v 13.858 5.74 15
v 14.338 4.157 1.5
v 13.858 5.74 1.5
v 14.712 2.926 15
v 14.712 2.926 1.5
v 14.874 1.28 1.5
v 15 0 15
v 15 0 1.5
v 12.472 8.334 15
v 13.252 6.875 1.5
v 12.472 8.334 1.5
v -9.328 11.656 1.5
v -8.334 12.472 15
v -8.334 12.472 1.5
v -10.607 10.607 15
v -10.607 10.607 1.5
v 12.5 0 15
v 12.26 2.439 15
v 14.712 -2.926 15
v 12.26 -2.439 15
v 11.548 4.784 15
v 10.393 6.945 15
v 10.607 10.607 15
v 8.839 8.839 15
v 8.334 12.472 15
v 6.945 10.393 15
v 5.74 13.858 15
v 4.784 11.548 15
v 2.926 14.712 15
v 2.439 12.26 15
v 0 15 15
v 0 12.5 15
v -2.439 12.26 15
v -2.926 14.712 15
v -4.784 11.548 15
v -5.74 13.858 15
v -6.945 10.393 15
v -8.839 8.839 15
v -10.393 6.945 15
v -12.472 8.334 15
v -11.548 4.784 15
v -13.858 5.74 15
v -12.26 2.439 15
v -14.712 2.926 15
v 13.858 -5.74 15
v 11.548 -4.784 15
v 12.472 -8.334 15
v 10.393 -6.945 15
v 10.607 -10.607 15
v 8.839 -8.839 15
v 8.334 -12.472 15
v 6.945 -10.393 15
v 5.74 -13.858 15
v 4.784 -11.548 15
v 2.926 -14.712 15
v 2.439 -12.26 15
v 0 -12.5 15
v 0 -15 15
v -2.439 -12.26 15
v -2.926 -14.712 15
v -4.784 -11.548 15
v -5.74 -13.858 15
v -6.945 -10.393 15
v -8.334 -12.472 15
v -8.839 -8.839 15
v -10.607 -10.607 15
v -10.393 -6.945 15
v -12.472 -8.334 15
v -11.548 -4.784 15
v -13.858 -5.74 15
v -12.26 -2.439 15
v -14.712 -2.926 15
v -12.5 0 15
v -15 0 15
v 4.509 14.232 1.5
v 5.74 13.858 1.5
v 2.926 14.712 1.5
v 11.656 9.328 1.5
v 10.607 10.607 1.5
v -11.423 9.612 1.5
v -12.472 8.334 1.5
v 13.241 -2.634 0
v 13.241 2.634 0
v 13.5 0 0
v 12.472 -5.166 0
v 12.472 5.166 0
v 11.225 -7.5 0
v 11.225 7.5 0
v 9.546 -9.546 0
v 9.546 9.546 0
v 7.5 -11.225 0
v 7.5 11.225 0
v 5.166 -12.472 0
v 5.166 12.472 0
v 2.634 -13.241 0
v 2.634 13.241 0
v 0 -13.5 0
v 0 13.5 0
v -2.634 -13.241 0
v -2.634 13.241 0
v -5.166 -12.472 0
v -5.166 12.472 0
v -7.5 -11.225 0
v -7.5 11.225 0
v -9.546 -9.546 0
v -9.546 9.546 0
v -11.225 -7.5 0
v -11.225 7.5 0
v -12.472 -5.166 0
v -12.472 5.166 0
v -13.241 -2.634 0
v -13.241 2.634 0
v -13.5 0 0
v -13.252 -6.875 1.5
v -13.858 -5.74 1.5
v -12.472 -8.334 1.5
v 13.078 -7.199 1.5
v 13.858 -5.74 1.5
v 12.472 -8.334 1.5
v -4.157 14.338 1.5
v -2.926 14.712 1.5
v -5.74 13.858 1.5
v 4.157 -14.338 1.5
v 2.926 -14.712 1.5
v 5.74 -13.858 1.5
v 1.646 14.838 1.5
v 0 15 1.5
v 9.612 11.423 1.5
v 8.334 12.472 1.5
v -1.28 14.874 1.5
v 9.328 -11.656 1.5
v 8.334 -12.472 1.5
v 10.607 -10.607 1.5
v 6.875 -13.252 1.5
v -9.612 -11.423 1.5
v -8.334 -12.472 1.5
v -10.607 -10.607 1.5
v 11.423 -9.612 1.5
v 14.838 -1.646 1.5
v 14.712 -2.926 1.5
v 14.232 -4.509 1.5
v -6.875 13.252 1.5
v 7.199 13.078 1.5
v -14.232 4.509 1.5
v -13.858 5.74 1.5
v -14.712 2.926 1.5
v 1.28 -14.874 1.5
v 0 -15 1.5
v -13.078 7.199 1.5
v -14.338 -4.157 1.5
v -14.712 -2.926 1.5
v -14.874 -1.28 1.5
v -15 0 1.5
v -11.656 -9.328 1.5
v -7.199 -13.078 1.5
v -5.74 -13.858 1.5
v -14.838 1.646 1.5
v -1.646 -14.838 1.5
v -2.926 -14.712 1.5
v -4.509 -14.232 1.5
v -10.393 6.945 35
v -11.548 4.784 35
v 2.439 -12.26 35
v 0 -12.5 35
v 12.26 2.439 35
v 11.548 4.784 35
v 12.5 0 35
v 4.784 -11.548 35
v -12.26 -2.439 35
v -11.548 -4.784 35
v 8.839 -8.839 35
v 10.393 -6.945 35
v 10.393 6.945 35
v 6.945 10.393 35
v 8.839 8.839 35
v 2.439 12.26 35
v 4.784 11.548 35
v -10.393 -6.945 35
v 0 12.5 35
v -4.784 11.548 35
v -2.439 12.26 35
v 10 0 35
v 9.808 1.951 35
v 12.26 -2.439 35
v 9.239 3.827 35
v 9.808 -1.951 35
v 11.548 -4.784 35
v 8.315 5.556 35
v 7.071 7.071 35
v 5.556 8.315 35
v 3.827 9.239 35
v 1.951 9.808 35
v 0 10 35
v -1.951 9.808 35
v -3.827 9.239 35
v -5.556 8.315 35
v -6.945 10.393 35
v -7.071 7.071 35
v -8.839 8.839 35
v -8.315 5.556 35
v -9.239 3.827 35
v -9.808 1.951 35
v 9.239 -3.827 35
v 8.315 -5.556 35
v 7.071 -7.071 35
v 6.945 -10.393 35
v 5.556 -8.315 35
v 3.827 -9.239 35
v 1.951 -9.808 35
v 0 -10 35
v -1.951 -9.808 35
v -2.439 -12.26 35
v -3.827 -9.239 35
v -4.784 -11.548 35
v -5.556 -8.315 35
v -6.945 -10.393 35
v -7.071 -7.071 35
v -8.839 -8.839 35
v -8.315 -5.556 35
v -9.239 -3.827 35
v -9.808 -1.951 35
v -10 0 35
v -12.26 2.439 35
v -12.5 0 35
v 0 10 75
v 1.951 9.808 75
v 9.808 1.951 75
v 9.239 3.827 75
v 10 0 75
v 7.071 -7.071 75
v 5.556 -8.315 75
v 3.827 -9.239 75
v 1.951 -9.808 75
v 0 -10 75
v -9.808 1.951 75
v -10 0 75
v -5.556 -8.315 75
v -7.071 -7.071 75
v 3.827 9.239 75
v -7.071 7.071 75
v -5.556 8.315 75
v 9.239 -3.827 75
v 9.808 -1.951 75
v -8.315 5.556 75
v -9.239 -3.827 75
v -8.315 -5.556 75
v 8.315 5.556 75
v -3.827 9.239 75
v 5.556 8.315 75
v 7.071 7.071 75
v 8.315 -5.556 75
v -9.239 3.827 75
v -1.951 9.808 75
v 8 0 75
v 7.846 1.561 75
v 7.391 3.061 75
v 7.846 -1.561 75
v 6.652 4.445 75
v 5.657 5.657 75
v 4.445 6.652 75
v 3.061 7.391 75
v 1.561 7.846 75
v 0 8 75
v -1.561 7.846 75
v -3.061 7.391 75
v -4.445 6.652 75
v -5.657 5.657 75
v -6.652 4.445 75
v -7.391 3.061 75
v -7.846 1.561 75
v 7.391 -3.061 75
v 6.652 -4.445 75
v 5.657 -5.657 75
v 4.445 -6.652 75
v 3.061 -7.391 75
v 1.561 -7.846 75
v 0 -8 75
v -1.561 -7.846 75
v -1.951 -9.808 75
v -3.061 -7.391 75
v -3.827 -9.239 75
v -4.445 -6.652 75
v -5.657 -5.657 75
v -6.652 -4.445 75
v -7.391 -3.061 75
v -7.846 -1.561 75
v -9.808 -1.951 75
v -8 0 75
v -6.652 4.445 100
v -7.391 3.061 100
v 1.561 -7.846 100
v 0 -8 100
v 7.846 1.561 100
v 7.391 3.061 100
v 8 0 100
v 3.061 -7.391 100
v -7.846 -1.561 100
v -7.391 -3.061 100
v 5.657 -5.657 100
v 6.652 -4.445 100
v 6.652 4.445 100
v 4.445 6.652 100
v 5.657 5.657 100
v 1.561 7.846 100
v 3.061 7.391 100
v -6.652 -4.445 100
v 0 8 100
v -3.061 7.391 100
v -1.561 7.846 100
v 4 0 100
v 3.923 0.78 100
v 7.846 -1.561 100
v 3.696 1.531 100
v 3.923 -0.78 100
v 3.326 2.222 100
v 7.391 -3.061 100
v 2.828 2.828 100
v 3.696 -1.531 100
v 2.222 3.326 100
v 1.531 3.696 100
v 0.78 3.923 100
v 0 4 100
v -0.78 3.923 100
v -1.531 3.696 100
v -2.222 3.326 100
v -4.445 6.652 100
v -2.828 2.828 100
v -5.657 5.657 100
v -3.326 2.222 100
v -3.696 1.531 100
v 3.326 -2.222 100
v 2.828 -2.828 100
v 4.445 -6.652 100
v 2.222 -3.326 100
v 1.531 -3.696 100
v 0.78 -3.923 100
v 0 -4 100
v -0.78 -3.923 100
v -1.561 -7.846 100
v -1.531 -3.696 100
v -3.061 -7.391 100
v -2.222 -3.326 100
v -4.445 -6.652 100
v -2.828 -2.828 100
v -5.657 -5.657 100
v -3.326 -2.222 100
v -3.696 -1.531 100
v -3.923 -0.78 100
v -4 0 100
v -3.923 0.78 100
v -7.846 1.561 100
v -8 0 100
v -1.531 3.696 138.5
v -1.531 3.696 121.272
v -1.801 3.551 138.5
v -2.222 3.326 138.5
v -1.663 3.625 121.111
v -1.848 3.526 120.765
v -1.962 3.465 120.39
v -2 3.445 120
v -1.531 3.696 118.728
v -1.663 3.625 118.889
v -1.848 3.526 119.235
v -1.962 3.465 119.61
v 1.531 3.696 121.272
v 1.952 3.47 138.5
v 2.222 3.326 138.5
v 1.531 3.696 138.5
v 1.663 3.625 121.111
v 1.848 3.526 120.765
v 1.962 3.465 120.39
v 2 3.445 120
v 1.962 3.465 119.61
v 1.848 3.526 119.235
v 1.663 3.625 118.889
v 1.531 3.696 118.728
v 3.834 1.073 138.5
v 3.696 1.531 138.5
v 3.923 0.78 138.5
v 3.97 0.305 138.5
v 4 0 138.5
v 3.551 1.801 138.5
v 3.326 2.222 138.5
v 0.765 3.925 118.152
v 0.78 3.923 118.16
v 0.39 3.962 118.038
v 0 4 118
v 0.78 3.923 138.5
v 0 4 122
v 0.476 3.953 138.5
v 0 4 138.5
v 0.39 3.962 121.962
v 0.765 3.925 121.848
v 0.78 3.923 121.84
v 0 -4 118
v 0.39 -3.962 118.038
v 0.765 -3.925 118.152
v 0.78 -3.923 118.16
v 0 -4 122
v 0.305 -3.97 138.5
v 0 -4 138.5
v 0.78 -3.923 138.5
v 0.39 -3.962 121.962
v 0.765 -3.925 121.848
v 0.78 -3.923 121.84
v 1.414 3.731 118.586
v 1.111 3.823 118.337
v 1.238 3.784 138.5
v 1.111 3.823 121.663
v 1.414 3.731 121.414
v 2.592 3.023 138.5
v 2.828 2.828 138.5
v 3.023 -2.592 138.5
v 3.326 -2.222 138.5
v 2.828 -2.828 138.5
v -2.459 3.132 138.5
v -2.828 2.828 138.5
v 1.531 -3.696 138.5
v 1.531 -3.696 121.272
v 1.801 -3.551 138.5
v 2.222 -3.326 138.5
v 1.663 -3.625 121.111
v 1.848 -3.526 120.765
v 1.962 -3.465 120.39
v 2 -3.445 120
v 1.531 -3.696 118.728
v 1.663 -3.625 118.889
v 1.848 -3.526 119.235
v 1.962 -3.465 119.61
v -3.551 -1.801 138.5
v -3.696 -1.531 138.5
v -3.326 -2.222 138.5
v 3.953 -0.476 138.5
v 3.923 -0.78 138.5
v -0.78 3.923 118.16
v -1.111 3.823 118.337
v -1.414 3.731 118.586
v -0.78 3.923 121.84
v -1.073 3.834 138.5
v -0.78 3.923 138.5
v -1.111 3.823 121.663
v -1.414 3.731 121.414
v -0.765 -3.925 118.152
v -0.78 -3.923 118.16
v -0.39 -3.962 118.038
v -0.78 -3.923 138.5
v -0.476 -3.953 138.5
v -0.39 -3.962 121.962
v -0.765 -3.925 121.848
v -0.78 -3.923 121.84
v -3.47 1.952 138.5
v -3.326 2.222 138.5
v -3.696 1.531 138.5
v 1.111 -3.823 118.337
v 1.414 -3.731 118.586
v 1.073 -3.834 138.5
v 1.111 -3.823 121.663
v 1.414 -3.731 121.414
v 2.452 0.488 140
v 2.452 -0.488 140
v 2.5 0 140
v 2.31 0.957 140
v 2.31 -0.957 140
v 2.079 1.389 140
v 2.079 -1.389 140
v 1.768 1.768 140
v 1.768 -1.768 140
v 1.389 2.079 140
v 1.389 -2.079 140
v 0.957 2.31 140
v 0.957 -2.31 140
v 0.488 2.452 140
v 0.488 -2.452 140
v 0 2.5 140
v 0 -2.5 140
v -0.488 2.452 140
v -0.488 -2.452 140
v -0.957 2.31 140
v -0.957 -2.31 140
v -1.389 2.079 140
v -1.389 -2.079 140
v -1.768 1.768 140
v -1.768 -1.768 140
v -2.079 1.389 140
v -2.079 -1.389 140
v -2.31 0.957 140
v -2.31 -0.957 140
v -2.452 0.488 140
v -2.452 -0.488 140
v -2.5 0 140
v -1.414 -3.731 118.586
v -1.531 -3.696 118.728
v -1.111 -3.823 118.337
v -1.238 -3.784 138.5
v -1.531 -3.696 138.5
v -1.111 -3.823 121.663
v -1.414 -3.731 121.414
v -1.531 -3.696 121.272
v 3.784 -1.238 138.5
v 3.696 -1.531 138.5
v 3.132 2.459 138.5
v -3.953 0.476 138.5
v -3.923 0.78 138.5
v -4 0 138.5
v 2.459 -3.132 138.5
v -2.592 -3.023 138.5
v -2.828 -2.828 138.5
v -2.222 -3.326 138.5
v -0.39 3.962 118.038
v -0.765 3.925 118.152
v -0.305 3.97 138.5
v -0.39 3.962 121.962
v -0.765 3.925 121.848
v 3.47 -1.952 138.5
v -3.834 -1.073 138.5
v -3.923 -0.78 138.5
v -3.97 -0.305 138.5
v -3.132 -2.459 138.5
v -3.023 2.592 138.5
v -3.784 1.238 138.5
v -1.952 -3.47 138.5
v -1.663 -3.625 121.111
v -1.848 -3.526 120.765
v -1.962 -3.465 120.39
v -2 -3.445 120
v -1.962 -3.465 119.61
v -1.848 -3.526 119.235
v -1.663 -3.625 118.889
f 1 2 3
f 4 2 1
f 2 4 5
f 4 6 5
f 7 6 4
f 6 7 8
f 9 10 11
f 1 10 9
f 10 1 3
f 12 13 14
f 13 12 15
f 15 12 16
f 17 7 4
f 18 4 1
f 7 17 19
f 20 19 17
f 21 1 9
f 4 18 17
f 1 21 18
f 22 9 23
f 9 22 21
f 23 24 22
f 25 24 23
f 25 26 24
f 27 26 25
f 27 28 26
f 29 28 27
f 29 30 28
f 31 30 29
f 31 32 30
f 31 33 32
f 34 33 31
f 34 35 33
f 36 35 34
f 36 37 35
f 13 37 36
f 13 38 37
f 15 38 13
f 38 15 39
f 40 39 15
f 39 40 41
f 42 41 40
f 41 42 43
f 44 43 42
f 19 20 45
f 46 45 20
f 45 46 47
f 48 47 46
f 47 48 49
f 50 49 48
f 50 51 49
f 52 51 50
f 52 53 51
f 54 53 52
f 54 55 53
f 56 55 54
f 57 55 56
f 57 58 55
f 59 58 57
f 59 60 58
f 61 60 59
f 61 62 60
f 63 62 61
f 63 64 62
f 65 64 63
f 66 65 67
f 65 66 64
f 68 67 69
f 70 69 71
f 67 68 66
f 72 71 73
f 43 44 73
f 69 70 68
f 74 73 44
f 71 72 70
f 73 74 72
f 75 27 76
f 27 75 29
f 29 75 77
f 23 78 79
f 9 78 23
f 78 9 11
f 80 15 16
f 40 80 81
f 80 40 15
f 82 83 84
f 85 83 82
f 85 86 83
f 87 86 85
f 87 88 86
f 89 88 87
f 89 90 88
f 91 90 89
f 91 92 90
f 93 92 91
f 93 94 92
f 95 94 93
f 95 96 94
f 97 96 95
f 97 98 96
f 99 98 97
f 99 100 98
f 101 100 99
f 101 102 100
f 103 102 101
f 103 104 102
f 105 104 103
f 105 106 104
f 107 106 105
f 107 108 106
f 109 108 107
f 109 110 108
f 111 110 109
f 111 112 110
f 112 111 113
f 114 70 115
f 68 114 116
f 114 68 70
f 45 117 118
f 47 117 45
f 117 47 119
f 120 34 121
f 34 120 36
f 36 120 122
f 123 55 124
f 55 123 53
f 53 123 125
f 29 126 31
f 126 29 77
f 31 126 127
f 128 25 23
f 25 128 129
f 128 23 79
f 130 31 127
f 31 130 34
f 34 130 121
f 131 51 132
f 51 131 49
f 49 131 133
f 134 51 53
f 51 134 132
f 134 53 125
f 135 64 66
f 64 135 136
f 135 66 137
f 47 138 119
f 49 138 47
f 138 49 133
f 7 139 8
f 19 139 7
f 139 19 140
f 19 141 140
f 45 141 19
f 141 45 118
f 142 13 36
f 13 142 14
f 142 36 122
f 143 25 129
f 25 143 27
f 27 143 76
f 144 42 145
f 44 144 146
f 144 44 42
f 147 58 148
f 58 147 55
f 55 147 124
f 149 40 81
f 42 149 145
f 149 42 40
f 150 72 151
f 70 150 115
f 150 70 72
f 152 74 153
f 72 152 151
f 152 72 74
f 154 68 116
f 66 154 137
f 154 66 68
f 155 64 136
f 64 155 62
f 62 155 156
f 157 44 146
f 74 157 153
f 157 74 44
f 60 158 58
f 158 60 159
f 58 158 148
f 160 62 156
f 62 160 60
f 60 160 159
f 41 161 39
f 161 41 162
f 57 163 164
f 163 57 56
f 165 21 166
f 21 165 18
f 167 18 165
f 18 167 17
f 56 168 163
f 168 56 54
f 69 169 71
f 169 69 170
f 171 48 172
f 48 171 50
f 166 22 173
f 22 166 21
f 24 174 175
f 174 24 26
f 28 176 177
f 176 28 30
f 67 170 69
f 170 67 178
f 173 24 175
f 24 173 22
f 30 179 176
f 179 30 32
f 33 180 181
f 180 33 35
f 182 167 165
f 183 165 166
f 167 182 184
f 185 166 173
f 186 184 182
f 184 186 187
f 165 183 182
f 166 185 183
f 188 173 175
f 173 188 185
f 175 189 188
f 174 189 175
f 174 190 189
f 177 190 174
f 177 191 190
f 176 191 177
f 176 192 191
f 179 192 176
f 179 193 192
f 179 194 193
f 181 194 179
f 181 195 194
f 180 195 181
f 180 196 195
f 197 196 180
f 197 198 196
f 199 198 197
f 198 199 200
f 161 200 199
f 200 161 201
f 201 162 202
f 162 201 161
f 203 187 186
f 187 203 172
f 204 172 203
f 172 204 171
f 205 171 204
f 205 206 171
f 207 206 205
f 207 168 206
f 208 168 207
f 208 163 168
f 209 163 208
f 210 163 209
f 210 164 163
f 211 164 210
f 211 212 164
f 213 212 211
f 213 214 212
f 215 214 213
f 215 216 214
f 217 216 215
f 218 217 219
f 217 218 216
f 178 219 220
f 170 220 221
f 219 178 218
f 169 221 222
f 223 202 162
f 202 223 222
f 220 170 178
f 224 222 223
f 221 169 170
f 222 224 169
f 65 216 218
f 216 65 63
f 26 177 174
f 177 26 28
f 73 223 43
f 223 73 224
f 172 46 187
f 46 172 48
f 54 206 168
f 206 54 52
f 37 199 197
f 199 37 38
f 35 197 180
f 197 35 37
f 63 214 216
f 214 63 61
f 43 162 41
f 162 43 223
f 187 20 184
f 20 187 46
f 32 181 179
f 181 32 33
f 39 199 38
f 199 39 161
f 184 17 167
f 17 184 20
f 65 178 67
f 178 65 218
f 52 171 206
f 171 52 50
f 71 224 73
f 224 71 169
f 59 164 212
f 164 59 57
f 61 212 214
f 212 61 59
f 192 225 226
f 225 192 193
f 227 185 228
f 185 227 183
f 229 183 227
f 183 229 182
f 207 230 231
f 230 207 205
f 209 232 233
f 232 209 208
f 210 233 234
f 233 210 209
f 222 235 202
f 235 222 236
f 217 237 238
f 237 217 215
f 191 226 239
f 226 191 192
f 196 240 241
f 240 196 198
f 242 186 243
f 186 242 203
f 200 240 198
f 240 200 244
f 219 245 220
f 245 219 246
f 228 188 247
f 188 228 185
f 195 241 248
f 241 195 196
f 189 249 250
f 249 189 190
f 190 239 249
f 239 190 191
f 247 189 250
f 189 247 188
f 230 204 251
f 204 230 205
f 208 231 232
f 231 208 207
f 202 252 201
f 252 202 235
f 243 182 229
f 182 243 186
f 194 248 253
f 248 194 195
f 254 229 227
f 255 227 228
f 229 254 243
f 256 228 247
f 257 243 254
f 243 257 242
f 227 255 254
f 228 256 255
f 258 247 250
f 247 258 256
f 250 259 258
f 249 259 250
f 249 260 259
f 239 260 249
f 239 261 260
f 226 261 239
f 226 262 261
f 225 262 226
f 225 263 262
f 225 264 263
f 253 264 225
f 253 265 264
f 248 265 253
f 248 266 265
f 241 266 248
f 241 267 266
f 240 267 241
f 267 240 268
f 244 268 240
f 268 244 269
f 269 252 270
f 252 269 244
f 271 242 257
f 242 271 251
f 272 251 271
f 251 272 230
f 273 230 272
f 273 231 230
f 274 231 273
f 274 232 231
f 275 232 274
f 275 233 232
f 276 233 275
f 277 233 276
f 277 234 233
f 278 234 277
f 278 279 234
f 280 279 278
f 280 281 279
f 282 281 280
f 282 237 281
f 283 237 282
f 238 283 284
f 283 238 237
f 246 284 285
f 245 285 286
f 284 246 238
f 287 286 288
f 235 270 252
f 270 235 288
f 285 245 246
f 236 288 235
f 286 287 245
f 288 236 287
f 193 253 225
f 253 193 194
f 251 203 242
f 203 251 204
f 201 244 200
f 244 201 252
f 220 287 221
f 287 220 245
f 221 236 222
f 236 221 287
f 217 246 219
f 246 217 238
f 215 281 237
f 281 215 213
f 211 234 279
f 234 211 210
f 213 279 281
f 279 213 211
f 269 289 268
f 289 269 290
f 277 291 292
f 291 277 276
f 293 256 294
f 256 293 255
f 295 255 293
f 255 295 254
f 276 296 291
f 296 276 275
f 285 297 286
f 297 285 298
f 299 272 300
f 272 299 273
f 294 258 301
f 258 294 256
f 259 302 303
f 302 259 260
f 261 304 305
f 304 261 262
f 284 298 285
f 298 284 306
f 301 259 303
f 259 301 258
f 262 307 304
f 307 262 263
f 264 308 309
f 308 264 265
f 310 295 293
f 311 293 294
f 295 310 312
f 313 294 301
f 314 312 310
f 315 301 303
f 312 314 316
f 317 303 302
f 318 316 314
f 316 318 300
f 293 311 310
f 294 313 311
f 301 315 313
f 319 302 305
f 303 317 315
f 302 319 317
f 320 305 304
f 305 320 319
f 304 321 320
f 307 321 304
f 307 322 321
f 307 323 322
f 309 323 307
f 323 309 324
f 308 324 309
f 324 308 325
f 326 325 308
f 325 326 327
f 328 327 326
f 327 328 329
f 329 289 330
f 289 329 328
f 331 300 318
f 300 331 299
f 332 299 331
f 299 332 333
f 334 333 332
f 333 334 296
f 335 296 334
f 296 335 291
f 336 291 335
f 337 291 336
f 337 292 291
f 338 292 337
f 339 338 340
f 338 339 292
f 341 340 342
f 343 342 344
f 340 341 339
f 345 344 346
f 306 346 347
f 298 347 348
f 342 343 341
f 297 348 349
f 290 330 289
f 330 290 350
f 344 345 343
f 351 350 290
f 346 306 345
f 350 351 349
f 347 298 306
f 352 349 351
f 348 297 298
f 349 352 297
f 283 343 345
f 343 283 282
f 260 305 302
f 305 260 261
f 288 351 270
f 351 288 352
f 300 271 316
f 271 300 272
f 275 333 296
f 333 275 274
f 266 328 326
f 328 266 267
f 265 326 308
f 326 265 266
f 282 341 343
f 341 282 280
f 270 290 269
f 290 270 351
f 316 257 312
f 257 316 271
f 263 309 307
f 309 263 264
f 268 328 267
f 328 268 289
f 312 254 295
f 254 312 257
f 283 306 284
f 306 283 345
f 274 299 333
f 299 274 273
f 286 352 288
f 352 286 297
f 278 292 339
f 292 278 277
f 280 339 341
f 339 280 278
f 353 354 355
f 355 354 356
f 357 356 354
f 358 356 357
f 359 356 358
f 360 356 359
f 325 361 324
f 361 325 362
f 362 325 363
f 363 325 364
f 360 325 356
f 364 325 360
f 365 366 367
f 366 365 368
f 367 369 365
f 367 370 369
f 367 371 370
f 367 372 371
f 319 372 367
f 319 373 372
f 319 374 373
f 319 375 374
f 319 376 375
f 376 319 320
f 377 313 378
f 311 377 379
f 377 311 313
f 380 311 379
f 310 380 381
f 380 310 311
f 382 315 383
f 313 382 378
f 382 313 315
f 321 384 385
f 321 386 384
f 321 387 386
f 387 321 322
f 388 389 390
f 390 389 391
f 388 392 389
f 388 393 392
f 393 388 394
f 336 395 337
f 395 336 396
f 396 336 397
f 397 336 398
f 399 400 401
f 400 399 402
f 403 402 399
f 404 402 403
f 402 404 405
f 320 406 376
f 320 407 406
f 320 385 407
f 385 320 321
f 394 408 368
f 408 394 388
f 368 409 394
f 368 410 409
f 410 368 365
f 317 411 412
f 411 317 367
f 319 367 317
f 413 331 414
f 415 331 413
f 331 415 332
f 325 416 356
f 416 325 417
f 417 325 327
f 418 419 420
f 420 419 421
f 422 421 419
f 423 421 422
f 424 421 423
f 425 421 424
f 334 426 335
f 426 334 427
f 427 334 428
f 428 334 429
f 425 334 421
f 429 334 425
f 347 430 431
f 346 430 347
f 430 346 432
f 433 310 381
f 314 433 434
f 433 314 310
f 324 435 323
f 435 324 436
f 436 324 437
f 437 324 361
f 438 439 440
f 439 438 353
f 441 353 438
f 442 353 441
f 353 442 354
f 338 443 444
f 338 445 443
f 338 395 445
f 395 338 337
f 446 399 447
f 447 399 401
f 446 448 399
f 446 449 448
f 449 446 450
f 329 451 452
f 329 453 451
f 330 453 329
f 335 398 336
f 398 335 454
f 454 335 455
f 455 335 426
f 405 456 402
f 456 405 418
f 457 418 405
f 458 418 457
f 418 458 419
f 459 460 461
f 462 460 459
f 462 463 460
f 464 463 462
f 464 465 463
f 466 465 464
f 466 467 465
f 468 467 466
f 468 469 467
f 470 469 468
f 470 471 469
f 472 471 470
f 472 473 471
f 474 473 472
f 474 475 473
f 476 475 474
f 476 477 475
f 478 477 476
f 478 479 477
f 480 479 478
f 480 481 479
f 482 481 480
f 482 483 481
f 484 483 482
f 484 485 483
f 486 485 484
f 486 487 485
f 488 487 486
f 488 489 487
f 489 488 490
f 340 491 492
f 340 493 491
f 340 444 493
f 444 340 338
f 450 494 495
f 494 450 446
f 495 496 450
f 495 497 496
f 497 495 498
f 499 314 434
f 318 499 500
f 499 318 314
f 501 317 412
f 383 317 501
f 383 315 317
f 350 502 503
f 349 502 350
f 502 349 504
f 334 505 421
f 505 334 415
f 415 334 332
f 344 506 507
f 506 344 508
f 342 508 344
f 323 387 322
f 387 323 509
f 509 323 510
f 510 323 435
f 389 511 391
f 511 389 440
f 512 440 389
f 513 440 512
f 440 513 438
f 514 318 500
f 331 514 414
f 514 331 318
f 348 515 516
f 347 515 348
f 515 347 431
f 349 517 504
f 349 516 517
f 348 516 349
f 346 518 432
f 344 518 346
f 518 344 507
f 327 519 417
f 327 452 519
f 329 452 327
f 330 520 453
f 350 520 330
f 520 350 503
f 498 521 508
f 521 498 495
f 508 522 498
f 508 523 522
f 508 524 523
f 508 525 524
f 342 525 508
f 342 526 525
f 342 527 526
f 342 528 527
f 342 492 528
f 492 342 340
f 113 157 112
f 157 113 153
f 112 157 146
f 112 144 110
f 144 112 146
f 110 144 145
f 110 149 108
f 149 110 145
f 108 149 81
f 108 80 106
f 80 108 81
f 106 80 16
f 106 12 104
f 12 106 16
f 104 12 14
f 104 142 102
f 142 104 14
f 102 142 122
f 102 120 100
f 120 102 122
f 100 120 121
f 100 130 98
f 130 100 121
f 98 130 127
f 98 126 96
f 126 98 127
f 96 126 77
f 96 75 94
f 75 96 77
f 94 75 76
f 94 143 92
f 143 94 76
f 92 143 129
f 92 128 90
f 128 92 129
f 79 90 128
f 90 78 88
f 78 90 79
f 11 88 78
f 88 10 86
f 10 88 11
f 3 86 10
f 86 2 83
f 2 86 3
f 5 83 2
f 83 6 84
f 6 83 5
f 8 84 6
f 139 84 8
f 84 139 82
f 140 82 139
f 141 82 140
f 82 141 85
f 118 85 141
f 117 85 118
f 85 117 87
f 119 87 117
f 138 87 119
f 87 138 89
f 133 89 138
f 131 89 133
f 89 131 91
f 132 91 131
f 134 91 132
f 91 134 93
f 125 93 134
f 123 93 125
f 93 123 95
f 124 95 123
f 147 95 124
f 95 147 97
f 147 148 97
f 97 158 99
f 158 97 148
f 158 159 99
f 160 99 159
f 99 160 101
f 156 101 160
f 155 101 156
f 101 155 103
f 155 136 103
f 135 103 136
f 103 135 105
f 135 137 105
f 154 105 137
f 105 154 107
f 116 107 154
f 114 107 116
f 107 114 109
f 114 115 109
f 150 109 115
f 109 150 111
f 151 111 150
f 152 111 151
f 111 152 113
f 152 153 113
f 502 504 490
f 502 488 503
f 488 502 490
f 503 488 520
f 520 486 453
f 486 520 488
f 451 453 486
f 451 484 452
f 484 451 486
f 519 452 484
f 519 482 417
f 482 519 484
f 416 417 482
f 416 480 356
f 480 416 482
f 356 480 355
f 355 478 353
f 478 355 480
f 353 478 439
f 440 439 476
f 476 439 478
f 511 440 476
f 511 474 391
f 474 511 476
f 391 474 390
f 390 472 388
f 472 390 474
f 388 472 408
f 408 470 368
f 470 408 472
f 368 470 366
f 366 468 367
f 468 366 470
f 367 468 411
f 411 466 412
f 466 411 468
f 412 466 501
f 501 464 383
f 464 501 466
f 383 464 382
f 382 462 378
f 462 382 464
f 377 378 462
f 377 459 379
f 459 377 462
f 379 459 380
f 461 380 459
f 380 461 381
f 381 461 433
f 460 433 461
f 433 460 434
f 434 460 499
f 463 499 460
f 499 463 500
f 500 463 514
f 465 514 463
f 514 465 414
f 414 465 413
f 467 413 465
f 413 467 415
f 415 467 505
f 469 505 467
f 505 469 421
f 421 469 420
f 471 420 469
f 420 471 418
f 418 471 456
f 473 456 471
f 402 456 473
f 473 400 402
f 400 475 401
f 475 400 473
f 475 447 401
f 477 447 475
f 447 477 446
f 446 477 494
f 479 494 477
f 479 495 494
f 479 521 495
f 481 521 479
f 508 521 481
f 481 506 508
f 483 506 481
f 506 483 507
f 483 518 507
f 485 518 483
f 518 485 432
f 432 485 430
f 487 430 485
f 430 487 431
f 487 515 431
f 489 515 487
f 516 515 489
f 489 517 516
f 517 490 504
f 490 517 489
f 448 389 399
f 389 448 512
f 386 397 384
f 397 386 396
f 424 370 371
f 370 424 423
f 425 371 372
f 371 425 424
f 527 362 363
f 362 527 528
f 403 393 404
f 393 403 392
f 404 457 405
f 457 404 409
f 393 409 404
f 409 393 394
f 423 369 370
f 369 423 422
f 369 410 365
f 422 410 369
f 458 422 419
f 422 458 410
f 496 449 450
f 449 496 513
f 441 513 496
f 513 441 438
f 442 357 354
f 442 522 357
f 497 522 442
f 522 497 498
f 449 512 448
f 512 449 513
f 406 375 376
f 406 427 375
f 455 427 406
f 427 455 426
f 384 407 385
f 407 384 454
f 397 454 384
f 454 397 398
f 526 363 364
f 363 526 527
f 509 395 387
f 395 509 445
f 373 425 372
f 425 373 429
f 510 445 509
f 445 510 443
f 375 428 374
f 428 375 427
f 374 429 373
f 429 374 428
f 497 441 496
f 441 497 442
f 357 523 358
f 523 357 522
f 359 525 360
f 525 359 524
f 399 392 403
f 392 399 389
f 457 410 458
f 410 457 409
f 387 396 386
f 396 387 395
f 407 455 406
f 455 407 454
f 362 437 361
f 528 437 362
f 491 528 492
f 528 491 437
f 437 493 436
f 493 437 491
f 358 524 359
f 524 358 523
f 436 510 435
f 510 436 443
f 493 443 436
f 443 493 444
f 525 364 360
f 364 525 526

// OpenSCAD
$fn = 32;

// ----------------------------------------------------------------------
// Stepped shaft: diameters 30, 25, 20, 16, 8 mm, 140 mm long
// ----------------------------------------------------------------------

// --- parameters (mm) ---
d1 = 30;                  // step 1 diameter
len1 = 15;                // step 1 length
d2 = 25;                  // step 2 diameter
len2 = 20;                // step 2 length
d3 = 20;                  // step 3 diameter
len3 = 40;                // step 3 length
d4 = 16;                  // step 4 diameter
len4 = 25;                // step 4 length
d5 = 8;                   // step 5 diameter
len5 = 40;                // step 5 length
total = 140;              // overall length
chamfer = 1.5;            // end chamfer
cross_d = 4;              // cross pin hole
cross_z = 120;            // cross hole position

difference() {
  /* turned body: stacked cylinders, every step sunk into the bigger one */
  union() {
    cylinder(h = len1, d = d1);
    translate([0, 0, 14.6]) cylinder(h = 20.4, d = d2);
    translate([0, 0, 34.6]) cylinder(h = 40.4, d = d3);
    translate([0, 0, 74.6]) cylinder(h = 25.4, d = d4);
    translate([0, 0, 99.6]) cylinder(h = 40.4, d = d5);
  }
  /* bottom chamfer ring cut */
  rotate_extrude() translate([13.5, -2.5]) polygon([[0, 0], [4, 0], [4, 6.5], [0, 2.5]]);
  /* top chamfer ring cut */
  rotate_extrude() translate([2.5, 140]) polygon([[0, 0], [4, -4], [4, 2.5], [0, 2.5]]);
  /* cross pin hole through the small step */
  translate([0, 0, cross_z]) rotate([90, 0, 0]) cylinder(h = d5 + 5, d = cross_d, center = true);
}
